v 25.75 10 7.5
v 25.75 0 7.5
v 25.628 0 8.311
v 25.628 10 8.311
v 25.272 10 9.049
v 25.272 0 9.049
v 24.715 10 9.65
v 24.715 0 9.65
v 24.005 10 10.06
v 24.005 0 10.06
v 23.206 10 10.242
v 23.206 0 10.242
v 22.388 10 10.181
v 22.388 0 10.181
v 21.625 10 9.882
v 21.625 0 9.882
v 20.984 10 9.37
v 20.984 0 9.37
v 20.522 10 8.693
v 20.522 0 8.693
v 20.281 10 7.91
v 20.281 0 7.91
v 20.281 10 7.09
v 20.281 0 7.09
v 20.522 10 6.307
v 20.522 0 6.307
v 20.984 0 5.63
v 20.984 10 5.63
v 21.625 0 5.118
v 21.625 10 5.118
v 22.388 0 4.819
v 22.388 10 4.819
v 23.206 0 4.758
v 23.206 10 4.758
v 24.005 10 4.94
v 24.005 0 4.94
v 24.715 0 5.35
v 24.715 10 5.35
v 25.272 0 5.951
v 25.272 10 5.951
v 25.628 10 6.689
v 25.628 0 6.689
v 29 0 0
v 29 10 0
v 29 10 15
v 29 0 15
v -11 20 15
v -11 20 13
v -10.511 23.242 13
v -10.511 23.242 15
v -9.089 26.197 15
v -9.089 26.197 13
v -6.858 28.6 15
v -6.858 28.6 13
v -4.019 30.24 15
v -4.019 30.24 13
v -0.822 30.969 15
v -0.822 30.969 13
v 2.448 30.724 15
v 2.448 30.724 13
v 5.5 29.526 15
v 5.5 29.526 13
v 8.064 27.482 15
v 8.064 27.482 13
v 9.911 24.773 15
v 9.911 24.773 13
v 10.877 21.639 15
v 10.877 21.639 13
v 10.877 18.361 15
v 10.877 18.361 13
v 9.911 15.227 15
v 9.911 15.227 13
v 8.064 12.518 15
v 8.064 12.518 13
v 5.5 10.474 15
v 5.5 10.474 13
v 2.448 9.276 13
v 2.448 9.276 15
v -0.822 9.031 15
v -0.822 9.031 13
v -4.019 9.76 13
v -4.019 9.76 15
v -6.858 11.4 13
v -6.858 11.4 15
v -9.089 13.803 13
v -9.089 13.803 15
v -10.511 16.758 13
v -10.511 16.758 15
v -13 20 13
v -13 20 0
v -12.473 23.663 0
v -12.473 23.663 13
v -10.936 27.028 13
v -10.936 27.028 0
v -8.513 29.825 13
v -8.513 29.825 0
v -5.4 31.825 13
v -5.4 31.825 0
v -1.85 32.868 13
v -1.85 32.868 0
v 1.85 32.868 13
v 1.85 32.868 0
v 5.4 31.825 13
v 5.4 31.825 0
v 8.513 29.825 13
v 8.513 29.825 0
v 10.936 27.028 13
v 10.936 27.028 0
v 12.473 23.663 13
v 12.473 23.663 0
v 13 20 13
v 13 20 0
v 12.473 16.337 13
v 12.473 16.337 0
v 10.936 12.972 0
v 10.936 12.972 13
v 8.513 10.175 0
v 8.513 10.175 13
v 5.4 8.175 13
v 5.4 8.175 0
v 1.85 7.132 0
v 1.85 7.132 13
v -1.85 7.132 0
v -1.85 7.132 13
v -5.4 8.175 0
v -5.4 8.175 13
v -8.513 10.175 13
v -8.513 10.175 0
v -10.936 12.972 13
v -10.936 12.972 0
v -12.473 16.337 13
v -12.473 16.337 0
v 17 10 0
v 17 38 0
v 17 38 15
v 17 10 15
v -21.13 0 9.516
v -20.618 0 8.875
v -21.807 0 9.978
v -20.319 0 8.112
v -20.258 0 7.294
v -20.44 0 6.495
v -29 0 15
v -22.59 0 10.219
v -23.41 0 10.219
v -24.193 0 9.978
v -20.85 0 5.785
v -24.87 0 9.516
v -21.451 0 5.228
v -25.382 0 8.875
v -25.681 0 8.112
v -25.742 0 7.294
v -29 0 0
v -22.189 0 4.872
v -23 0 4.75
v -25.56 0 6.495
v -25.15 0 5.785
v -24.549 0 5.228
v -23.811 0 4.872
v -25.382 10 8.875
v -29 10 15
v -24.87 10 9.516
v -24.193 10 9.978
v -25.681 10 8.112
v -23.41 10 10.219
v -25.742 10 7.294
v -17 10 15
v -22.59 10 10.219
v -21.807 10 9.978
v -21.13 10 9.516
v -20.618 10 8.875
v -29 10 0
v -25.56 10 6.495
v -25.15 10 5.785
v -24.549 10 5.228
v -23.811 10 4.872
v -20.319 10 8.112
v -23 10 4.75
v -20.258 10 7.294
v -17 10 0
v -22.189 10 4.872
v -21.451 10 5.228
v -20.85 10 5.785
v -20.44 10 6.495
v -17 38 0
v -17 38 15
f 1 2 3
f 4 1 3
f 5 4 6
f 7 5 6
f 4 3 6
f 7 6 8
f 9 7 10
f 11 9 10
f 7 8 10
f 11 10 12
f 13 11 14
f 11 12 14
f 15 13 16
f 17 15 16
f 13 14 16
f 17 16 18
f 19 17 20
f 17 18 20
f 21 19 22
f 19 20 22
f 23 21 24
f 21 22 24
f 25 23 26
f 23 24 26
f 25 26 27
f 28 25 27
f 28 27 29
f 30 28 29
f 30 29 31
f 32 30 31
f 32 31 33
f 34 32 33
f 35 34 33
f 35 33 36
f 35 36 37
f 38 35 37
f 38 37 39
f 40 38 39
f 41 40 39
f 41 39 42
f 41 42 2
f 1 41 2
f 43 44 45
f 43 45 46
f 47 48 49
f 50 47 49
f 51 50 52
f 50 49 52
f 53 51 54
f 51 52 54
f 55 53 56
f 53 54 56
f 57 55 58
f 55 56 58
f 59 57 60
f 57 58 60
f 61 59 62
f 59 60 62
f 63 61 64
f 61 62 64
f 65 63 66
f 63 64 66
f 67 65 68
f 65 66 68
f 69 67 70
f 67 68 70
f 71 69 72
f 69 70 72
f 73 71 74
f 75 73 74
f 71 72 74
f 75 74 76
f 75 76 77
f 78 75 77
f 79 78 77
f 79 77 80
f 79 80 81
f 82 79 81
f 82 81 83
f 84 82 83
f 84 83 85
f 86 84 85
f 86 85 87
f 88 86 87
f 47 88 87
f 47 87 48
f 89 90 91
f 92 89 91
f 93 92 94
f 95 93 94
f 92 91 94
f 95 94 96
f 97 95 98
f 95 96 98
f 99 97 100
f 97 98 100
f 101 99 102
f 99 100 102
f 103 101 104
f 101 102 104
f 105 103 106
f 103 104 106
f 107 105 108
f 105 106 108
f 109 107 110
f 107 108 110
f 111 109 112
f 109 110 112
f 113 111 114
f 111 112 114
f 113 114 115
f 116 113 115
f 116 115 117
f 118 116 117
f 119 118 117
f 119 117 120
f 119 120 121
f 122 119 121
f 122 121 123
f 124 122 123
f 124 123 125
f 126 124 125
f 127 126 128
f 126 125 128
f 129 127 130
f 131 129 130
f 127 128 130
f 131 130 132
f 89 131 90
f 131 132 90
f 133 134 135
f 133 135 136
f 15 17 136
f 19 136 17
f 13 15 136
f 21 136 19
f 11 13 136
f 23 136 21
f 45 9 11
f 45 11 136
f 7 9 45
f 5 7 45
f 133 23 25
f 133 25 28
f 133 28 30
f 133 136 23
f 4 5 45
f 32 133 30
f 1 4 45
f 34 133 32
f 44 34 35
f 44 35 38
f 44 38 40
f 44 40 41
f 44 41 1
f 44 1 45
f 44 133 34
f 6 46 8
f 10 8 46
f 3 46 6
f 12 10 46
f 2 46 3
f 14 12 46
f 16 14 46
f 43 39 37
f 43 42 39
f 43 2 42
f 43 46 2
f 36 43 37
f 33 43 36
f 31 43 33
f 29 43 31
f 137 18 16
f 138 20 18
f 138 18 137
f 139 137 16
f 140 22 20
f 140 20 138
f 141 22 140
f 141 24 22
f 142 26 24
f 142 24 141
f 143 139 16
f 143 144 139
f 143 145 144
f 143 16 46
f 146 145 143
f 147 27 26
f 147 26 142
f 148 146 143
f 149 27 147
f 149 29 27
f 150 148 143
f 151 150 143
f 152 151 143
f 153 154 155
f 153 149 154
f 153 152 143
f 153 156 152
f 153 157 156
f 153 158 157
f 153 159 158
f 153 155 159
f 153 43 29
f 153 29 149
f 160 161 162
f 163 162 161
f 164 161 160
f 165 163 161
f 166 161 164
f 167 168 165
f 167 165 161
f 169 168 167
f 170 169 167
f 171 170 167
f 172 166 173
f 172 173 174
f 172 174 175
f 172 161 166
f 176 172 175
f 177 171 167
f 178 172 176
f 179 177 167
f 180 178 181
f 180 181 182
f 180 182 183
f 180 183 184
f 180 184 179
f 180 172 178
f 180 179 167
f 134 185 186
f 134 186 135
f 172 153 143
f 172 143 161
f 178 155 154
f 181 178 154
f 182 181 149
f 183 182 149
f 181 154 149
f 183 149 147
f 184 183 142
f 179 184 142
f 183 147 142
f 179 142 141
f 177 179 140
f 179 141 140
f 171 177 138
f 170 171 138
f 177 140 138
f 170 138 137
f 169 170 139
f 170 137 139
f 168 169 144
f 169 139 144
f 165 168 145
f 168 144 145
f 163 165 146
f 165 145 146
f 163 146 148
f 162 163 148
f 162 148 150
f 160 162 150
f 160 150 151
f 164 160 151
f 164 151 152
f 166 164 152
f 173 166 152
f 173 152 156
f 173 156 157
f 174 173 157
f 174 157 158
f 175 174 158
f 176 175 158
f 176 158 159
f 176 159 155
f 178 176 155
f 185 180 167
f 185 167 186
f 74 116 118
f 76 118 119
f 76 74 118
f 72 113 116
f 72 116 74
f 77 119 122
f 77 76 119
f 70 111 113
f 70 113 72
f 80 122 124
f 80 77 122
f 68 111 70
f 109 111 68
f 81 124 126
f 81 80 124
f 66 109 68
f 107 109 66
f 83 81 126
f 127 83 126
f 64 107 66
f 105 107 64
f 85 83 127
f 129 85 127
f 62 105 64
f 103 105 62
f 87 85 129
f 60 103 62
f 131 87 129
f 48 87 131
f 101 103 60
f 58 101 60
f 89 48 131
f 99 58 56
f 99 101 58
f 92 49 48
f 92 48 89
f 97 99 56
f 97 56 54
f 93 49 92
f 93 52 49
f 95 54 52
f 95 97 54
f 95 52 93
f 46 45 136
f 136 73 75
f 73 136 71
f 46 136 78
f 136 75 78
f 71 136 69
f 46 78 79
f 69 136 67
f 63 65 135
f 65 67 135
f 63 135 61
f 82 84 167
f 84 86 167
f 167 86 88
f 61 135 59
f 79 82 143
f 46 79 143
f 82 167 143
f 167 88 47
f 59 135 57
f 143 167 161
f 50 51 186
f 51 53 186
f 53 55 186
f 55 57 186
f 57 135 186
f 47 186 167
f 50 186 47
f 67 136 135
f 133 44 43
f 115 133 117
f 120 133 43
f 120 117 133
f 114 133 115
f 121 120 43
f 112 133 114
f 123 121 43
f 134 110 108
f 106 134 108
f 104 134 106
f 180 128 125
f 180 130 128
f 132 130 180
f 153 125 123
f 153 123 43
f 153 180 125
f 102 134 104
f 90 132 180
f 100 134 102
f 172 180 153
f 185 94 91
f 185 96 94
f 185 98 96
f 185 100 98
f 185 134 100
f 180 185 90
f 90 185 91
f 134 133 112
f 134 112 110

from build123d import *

# Parameters (mm, degrees)
EXTRUDE_1_DEPTH     = 15
SKETCH_2_R          = 11
CUT_EXTRUDE_1_DEPTH = 51.0999002
SKETCH_3_R          = 13
CUT_EXTRUDE_2_DEPTH = 13
SKETCH_4_R          = 2.75
CUT_EXTRUDE_3_DEPTH = 51.0999002


with BuildPart() as part:
    # 草图1 → 凸台-拉伸1 (new body)
    with BuildSketch(Plane.XY):
        Polygon((29, 0), (-29, 0), (-29, 10), (-17, 10), (-17, 38), (17, 38), (17, 10), (29, 10), align=None)
    extrude(amount=EXTRUDE_1_DEPTH)

    # 草图2 → 切除-拉伸1 (cut, through all)
    with BuildSketch(Plane(origin=(0, 0, 0), x_dir=(-1, 0, 0), z_dir=(0, 0, -1))):
        with Locations((0, 20)):
            Circle(SKETCH_2_R)
    extrude(amount=-CUT_EXTRUDE_1_DEPTH, mode=Mode.SUBTRACT)

    # 草图3 → 切除-拉伸2 (cut)
    with BuildSketch(Plane(origin=(0, 0, 0), x_dir=(-1, 0, 0), z_dir=(0, 0, -1))):
        with Locations((0, 20)):
            Circle(SKETCH_3_R)
    extrude(amount=-CUT_EXTRUDE_2_DEPTH, mode=Mode.SUBTRACT)

    # 草图4 → 切除-拉伸3 (cut, through all)
    with BuildSketch(Plane.XZ):
        with Locations(Location((-23, 7.5, 0), (0, 0, 270))):
            Circle(SKETCH_4_R)
        with Locations((23, 7.5)):
            Circle(SKETCH_4_R)
    extrude(amount=-CUT_EXTRUDE_3_DEPTH, mode=Mode.SUBTRACT)


solid = part.part
